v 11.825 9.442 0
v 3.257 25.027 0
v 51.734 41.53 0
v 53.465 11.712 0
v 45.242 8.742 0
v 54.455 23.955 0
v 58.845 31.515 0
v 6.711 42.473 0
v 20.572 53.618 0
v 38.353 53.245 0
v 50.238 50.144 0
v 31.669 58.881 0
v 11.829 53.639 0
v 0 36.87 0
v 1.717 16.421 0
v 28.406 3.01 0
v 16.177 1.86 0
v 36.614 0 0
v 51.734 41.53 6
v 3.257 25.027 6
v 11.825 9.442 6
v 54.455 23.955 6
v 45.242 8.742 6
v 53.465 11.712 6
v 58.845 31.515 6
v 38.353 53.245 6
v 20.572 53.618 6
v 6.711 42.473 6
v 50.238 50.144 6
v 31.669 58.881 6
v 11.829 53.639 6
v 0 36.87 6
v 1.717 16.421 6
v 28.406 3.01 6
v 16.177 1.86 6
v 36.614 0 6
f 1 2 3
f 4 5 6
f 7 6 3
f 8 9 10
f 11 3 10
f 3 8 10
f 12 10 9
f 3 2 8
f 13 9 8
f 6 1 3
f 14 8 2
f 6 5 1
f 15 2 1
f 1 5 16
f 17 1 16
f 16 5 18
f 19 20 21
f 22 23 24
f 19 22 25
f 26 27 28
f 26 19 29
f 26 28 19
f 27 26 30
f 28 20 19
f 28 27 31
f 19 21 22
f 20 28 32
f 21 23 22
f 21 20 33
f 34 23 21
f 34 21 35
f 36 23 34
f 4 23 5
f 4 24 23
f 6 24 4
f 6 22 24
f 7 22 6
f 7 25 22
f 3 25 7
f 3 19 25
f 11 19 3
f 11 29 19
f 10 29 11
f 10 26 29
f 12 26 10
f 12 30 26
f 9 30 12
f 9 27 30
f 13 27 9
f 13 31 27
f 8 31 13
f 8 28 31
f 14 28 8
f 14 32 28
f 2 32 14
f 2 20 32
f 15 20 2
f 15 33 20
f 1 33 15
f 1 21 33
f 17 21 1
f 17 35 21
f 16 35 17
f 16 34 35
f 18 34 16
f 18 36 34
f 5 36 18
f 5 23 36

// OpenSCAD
$fn = 32;

// ----------------------------------------------------------------------
// Chain sprocket: 9 teeth, 26 mm root radius
// ----------------------------------------------------------------------

// --- parameters (mm) ---
profile_height = 6;       // extrusion height
profile_points = 18;      // points of the closed outline

profile = [[54.455, 23.955], [58.845, 31.515], [51.734, 41.53], [50.238, 50.144], [38.353, 53.245], [31.669, 58.881], [20.572, 53.618], [11.829, 53.639], [6.711, 42.473], [0, 36.87], [3.257, 25.027], [1.717, 16.421], [11.825, 9.442], [16.177, 1.86], [28.406, 3.01], [36.614, 0], [45.242, 8.742], [53.465, 11.712]];  // single closed polygon, 18 points, counter clockwise

// --- the one profile operation ---
linear_extrude(height = profile_height) polygon(points = profile);
